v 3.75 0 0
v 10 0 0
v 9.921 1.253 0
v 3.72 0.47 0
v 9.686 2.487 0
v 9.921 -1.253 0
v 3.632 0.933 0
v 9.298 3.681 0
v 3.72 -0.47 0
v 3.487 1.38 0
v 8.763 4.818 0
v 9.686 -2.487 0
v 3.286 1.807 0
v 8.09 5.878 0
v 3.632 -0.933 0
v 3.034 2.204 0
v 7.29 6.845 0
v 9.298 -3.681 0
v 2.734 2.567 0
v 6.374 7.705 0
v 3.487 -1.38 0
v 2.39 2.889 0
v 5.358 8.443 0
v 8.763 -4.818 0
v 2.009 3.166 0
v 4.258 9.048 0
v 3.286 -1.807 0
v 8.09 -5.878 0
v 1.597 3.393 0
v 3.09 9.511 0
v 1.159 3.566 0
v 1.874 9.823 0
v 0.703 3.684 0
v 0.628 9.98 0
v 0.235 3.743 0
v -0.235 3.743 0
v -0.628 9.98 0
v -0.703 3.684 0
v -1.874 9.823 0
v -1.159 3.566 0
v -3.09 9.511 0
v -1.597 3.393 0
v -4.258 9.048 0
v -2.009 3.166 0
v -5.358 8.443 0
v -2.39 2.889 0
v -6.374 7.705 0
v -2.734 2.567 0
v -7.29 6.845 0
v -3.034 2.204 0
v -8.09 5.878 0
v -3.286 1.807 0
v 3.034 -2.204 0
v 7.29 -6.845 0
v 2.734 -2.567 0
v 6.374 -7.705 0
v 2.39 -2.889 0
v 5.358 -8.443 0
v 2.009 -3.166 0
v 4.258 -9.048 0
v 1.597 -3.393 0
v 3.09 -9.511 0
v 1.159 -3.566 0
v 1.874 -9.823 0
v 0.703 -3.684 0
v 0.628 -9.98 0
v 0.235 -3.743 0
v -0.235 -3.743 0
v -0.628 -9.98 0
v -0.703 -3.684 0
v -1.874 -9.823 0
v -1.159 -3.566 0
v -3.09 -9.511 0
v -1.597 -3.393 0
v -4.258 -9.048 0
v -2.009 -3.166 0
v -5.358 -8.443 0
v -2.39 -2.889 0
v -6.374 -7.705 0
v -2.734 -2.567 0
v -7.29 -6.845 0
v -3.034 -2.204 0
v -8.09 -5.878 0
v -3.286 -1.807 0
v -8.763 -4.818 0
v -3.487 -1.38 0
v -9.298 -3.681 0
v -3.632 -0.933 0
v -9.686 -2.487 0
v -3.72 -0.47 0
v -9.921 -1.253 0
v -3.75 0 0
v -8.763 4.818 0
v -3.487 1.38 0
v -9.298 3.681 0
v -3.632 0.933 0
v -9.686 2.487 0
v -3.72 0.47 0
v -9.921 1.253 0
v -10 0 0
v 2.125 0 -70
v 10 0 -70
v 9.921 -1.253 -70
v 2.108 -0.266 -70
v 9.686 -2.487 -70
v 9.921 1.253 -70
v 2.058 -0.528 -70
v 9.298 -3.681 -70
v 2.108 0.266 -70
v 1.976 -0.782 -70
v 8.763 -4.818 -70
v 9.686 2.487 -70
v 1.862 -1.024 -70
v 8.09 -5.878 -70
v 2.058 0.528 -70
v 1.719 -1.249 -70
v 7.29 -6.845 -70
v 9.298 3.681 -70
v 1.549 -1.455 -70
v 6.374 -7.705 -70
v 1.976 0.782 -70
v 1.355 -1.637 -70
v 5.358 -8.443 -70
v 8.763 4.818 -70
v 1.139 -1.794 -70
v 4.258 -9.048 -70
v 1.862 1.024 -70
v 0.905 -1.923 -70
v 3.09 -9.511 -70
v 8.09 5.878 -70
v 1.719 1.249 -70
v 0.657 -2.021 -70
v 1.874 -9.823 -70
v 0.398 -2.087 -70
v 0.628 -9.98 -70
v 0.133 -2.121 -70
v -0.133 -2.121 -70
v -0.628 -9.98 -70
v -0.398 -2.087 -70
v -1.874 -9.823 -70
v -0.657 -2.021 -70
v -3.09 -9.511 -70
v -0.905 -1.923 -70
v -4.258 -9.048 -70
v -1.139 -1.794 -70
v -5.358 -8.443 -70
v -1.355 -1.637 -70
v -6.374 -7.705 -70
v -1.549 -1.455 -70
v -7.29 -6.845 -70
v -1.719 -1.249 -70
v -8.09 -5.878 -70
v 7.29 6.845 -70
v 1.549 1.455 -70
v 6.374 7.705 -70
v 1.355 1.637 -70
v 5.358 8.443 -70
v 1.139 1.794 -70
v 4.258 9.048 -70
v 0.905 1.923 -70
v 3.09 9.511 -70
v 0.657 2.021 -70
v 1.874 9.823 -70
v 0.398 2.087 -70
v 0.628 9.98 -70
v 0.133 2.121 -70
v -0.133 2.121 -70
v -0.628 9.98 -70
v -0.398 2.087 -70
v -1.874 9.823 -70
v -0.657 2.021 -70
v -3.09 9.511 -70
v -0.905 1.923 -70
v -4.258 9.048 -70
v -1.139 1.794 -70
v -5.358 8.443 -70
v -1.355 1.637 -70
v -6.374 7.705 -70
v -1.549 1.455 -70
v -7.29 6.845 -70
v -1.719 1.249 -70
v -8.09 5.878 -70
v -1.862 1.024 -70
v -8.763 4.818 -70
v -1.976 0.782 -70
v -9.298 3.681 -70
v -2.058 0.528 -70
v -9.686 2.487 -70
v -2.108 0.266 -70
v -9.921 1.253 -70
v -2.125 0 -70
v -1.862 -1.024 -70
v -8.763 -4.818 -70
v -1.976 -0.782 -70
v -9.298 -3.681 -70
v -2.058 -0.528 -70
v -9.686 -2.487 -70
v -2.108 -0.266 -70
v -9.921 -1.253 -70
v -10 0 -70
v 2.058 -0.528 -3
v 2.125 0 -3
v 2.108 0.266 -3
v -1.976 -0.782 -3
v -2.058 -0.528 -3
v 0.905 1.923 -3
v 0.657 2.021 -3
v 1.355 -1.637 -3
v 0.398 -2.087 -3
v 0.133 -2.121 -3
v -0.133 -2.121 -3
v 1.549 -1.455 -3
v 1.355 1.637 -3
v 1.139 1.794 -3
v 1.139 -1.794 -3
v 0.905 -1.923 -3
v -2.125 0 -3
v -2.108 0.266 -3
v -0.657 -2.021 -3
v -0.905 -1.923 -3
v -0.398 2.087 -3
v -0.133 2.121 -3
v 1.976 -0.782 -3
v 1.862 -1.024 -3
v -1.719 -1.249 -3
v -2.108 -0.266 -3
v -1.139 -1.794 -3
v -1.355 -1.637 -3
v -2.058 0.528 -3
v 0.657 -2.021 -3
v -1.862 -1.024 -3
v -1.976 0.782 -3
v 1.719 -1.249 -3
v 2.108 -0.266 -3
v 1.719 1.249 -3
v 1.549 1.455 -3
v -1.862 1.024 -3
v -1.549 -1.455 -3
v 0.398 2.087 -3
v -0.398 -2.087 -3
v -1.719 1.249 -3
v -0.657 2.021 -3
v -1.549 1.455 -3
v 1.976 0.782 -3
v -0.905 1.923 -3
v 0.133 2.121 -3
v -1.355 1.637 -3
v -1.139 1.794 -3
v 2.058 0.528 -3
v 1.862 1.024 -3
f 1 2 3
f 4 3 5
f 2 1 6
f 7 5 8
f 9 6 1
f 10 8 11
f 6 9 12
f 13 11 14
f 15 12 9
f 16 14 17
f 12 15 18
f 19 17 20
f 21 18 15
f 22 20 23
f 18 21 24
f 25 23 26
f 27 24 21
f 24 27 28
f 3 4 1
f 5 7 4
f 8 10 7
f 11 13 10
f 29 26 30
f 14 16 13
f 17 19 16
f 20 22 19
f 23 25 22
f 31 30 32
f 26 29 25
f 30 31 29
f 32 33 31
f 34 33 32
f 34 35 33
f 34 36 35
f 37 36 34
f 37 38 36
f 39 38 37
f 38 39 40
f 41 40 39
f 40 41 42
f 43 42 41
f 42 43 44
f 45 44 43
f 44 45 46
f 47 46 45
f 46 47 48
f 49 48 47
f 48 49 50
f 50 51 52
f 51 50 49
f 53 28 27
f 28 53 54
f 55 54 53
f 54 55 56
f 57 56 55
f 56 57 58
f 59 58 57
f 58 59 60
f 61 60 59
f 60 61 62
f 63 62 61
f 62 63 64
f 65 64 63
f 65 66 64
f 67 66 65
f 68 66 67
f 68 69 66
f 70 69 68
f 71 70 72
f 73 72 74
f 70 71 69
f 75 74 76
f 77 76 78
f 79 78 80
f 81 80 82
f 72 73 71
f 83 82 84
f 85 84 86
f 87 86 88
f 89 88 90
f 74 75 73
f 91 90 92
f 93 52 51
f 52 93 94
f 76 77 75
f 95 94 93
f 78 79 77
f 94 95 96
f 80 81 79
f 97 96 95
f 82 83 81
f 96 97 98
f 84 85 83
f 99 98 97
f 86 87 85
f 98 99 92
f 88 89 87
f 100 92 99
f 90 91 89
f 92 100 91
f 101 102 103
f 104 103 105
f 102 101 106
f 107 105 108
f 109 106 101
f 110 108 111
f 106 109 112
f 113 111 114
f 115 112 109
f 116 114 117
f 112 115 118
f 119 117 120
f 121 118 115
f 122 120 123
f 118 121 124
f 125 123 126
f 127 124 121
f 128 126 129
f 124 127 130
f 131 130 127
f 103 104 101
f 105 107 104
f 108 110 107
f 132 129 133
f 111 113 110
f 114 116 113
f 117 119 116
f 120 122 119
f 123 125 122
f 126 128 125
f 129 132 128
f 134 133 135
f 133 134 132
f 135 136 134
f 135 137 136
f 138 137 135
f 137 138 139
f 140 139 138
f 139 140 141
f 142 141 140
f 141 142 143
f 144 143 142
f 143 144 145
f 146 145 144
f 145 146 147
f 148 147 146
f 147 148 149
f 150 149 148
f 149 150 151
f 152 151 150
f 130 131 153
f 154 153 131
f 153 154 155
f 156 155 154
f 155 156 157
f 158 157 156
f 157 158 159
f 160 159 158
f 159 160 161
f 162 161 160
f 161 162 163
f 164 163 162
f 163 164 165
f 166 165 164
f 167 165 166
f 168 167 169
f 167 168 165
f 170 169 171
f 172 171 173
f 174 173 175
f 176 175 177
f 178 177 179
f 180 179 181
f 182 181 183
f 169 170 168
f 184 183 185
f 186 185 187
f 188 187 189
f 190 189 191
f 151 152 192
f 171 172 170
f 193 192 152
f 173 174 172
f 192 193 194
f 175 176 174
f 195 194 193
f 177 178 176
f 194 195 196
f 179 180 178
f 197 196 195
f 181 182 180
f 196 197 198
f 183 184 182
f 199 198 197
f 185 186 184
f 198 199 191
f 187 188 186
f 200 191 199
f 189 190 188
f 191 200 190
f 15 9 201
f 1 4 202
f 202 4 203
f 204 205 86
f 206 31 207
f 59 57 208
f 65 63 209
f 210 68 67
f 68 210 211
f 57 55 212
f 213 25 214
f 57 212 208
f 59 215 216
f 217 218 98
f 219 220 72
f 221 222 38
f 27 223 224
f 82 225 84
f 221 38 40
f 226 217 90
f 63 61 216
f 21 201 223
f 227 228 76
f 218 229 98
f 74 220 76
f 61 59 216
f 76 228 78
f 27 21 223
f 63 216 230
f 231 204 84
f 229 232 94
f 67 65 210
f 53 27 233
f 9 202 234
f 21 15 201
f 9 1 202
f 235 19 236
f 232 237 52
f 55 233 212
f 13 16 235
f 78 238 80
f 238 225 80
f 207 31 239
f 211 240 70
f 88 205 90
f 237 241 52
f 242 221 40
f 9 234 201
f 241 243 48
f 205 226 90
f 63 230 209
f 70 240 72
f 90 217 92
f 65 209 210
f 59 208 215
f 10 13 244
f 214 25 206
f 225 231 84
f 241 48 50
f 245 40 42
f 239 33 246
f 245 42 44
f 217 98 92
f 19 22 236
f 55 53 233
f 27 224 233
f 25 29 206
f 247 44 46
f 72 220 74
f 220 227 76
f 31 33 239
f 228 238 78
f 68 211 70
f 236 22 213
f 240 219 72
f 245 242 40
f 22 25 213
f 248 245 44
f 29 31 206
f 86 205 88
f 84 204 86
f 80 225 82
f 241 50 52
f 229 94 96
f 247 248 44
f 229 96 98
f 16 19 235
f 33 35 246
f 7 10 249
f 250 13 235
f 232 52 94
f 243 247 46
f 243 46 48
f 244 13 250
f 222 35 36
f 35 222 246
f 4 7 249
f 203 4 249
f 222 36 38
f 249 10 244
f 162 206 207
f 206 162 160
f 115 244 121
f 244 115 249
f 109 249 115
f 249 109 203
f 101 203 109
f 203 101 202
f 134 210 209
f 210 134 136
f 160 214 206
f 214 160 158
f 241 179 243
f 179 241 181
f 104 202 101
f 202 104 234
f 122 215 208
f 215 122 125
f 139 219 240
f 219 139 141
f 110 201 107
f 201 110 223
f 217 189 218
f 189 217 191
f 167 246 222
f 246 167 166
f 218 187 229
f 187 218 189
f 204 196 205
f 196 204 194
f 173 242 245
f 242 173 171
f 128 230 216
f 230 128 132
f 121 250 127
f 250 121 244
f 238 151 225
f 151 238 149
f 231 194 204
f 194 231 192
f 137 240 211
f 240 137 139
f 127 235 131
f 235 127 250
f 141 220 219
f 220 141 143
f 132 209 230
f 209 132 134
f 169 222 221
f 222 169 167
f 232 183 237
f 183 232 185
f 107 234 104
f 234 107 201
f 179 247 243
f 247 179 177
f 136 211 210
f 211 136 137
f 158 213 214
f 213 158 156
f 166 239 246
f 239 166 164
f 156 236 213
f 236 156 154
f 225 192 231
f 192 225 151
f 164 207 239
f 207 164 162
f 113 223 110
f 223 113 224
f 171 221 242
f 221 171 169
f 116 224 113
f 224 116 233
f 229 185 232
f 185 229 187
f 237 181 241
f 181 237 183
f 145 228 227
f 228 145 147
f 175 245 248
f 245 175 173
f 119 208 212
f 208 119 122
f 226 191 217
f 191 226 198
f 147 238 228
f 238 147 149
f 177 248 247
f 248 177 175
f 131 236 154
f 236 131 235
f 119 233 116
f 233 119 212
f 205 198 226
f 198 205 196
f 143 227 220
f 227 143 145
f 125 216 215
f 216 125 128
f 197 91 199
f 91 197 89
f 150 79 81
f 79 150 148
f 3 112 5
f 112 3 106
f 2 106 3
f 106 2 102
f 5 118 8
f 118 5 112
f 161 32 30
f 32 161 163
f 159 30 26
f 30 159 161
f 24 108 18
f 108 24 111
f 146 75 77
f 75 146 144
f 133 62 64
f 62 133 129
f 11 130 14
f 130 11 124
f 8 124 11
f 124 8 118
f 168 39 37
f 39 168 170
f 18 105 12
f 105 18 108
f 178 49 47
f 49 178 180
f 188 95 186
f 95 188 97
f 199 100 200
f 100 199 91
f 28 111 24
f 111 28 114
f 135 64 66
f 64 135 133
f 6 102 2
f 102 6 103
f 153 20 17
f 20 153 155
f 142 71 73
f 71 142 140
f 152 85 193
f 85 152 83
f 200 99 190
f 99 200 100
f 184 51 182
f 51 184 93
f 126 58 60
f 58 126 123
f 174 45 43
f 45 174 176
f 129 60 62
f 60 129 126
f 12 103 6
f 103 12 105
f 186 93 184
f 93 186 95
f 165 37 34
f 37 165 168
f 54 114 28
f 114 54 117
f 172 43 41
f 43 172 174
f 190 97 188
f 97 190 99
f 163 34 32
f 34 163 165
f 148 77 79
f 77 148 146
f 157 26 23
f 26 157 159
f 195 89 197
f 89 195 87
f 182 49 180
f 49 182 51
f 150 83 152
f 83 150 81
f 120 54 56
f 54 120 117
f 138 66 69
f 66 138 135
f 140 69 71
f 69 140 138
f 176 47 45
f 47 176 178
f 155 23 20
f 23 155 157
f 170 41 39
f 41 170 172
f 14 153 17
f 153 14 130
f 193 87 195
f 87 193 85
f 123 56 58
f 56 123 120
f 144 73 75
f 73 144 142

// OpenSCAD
$fn = 50;


difference() {
	union() {
		translate(v = [0, 0, -70.0000000000]) {
			cylinder(h = 70, r = 10.0000000000);
		}
		cylinder(h = 0, r = 13.0000000000);
	}
	union() {
		translate(v = [0, 0, 0]) {
			rotate(a = [0, 0, 0]) {
				difference() {
					union() {
						#translate(v = [0, 0, -70.0000000000]) {
							cylinder(h = 70, r = 2.0000000000);
						}
						#translate(v = [0, 0, -3]) {
							cylinder(h = 3, r1 = 2.1250000000, r2 = 3.7500000000);
						}
						#translate(v = [0, 0, -70.0000000000]) {
							cylinder(h = 70, r = 2.1250000000);
						}
						#translate(v = [0, 0, -70.0000000000]) {
							cylinder(h = 70, r = 2.0000000000);
						}
					}
					union();
				}
			}
		}
	}
}
